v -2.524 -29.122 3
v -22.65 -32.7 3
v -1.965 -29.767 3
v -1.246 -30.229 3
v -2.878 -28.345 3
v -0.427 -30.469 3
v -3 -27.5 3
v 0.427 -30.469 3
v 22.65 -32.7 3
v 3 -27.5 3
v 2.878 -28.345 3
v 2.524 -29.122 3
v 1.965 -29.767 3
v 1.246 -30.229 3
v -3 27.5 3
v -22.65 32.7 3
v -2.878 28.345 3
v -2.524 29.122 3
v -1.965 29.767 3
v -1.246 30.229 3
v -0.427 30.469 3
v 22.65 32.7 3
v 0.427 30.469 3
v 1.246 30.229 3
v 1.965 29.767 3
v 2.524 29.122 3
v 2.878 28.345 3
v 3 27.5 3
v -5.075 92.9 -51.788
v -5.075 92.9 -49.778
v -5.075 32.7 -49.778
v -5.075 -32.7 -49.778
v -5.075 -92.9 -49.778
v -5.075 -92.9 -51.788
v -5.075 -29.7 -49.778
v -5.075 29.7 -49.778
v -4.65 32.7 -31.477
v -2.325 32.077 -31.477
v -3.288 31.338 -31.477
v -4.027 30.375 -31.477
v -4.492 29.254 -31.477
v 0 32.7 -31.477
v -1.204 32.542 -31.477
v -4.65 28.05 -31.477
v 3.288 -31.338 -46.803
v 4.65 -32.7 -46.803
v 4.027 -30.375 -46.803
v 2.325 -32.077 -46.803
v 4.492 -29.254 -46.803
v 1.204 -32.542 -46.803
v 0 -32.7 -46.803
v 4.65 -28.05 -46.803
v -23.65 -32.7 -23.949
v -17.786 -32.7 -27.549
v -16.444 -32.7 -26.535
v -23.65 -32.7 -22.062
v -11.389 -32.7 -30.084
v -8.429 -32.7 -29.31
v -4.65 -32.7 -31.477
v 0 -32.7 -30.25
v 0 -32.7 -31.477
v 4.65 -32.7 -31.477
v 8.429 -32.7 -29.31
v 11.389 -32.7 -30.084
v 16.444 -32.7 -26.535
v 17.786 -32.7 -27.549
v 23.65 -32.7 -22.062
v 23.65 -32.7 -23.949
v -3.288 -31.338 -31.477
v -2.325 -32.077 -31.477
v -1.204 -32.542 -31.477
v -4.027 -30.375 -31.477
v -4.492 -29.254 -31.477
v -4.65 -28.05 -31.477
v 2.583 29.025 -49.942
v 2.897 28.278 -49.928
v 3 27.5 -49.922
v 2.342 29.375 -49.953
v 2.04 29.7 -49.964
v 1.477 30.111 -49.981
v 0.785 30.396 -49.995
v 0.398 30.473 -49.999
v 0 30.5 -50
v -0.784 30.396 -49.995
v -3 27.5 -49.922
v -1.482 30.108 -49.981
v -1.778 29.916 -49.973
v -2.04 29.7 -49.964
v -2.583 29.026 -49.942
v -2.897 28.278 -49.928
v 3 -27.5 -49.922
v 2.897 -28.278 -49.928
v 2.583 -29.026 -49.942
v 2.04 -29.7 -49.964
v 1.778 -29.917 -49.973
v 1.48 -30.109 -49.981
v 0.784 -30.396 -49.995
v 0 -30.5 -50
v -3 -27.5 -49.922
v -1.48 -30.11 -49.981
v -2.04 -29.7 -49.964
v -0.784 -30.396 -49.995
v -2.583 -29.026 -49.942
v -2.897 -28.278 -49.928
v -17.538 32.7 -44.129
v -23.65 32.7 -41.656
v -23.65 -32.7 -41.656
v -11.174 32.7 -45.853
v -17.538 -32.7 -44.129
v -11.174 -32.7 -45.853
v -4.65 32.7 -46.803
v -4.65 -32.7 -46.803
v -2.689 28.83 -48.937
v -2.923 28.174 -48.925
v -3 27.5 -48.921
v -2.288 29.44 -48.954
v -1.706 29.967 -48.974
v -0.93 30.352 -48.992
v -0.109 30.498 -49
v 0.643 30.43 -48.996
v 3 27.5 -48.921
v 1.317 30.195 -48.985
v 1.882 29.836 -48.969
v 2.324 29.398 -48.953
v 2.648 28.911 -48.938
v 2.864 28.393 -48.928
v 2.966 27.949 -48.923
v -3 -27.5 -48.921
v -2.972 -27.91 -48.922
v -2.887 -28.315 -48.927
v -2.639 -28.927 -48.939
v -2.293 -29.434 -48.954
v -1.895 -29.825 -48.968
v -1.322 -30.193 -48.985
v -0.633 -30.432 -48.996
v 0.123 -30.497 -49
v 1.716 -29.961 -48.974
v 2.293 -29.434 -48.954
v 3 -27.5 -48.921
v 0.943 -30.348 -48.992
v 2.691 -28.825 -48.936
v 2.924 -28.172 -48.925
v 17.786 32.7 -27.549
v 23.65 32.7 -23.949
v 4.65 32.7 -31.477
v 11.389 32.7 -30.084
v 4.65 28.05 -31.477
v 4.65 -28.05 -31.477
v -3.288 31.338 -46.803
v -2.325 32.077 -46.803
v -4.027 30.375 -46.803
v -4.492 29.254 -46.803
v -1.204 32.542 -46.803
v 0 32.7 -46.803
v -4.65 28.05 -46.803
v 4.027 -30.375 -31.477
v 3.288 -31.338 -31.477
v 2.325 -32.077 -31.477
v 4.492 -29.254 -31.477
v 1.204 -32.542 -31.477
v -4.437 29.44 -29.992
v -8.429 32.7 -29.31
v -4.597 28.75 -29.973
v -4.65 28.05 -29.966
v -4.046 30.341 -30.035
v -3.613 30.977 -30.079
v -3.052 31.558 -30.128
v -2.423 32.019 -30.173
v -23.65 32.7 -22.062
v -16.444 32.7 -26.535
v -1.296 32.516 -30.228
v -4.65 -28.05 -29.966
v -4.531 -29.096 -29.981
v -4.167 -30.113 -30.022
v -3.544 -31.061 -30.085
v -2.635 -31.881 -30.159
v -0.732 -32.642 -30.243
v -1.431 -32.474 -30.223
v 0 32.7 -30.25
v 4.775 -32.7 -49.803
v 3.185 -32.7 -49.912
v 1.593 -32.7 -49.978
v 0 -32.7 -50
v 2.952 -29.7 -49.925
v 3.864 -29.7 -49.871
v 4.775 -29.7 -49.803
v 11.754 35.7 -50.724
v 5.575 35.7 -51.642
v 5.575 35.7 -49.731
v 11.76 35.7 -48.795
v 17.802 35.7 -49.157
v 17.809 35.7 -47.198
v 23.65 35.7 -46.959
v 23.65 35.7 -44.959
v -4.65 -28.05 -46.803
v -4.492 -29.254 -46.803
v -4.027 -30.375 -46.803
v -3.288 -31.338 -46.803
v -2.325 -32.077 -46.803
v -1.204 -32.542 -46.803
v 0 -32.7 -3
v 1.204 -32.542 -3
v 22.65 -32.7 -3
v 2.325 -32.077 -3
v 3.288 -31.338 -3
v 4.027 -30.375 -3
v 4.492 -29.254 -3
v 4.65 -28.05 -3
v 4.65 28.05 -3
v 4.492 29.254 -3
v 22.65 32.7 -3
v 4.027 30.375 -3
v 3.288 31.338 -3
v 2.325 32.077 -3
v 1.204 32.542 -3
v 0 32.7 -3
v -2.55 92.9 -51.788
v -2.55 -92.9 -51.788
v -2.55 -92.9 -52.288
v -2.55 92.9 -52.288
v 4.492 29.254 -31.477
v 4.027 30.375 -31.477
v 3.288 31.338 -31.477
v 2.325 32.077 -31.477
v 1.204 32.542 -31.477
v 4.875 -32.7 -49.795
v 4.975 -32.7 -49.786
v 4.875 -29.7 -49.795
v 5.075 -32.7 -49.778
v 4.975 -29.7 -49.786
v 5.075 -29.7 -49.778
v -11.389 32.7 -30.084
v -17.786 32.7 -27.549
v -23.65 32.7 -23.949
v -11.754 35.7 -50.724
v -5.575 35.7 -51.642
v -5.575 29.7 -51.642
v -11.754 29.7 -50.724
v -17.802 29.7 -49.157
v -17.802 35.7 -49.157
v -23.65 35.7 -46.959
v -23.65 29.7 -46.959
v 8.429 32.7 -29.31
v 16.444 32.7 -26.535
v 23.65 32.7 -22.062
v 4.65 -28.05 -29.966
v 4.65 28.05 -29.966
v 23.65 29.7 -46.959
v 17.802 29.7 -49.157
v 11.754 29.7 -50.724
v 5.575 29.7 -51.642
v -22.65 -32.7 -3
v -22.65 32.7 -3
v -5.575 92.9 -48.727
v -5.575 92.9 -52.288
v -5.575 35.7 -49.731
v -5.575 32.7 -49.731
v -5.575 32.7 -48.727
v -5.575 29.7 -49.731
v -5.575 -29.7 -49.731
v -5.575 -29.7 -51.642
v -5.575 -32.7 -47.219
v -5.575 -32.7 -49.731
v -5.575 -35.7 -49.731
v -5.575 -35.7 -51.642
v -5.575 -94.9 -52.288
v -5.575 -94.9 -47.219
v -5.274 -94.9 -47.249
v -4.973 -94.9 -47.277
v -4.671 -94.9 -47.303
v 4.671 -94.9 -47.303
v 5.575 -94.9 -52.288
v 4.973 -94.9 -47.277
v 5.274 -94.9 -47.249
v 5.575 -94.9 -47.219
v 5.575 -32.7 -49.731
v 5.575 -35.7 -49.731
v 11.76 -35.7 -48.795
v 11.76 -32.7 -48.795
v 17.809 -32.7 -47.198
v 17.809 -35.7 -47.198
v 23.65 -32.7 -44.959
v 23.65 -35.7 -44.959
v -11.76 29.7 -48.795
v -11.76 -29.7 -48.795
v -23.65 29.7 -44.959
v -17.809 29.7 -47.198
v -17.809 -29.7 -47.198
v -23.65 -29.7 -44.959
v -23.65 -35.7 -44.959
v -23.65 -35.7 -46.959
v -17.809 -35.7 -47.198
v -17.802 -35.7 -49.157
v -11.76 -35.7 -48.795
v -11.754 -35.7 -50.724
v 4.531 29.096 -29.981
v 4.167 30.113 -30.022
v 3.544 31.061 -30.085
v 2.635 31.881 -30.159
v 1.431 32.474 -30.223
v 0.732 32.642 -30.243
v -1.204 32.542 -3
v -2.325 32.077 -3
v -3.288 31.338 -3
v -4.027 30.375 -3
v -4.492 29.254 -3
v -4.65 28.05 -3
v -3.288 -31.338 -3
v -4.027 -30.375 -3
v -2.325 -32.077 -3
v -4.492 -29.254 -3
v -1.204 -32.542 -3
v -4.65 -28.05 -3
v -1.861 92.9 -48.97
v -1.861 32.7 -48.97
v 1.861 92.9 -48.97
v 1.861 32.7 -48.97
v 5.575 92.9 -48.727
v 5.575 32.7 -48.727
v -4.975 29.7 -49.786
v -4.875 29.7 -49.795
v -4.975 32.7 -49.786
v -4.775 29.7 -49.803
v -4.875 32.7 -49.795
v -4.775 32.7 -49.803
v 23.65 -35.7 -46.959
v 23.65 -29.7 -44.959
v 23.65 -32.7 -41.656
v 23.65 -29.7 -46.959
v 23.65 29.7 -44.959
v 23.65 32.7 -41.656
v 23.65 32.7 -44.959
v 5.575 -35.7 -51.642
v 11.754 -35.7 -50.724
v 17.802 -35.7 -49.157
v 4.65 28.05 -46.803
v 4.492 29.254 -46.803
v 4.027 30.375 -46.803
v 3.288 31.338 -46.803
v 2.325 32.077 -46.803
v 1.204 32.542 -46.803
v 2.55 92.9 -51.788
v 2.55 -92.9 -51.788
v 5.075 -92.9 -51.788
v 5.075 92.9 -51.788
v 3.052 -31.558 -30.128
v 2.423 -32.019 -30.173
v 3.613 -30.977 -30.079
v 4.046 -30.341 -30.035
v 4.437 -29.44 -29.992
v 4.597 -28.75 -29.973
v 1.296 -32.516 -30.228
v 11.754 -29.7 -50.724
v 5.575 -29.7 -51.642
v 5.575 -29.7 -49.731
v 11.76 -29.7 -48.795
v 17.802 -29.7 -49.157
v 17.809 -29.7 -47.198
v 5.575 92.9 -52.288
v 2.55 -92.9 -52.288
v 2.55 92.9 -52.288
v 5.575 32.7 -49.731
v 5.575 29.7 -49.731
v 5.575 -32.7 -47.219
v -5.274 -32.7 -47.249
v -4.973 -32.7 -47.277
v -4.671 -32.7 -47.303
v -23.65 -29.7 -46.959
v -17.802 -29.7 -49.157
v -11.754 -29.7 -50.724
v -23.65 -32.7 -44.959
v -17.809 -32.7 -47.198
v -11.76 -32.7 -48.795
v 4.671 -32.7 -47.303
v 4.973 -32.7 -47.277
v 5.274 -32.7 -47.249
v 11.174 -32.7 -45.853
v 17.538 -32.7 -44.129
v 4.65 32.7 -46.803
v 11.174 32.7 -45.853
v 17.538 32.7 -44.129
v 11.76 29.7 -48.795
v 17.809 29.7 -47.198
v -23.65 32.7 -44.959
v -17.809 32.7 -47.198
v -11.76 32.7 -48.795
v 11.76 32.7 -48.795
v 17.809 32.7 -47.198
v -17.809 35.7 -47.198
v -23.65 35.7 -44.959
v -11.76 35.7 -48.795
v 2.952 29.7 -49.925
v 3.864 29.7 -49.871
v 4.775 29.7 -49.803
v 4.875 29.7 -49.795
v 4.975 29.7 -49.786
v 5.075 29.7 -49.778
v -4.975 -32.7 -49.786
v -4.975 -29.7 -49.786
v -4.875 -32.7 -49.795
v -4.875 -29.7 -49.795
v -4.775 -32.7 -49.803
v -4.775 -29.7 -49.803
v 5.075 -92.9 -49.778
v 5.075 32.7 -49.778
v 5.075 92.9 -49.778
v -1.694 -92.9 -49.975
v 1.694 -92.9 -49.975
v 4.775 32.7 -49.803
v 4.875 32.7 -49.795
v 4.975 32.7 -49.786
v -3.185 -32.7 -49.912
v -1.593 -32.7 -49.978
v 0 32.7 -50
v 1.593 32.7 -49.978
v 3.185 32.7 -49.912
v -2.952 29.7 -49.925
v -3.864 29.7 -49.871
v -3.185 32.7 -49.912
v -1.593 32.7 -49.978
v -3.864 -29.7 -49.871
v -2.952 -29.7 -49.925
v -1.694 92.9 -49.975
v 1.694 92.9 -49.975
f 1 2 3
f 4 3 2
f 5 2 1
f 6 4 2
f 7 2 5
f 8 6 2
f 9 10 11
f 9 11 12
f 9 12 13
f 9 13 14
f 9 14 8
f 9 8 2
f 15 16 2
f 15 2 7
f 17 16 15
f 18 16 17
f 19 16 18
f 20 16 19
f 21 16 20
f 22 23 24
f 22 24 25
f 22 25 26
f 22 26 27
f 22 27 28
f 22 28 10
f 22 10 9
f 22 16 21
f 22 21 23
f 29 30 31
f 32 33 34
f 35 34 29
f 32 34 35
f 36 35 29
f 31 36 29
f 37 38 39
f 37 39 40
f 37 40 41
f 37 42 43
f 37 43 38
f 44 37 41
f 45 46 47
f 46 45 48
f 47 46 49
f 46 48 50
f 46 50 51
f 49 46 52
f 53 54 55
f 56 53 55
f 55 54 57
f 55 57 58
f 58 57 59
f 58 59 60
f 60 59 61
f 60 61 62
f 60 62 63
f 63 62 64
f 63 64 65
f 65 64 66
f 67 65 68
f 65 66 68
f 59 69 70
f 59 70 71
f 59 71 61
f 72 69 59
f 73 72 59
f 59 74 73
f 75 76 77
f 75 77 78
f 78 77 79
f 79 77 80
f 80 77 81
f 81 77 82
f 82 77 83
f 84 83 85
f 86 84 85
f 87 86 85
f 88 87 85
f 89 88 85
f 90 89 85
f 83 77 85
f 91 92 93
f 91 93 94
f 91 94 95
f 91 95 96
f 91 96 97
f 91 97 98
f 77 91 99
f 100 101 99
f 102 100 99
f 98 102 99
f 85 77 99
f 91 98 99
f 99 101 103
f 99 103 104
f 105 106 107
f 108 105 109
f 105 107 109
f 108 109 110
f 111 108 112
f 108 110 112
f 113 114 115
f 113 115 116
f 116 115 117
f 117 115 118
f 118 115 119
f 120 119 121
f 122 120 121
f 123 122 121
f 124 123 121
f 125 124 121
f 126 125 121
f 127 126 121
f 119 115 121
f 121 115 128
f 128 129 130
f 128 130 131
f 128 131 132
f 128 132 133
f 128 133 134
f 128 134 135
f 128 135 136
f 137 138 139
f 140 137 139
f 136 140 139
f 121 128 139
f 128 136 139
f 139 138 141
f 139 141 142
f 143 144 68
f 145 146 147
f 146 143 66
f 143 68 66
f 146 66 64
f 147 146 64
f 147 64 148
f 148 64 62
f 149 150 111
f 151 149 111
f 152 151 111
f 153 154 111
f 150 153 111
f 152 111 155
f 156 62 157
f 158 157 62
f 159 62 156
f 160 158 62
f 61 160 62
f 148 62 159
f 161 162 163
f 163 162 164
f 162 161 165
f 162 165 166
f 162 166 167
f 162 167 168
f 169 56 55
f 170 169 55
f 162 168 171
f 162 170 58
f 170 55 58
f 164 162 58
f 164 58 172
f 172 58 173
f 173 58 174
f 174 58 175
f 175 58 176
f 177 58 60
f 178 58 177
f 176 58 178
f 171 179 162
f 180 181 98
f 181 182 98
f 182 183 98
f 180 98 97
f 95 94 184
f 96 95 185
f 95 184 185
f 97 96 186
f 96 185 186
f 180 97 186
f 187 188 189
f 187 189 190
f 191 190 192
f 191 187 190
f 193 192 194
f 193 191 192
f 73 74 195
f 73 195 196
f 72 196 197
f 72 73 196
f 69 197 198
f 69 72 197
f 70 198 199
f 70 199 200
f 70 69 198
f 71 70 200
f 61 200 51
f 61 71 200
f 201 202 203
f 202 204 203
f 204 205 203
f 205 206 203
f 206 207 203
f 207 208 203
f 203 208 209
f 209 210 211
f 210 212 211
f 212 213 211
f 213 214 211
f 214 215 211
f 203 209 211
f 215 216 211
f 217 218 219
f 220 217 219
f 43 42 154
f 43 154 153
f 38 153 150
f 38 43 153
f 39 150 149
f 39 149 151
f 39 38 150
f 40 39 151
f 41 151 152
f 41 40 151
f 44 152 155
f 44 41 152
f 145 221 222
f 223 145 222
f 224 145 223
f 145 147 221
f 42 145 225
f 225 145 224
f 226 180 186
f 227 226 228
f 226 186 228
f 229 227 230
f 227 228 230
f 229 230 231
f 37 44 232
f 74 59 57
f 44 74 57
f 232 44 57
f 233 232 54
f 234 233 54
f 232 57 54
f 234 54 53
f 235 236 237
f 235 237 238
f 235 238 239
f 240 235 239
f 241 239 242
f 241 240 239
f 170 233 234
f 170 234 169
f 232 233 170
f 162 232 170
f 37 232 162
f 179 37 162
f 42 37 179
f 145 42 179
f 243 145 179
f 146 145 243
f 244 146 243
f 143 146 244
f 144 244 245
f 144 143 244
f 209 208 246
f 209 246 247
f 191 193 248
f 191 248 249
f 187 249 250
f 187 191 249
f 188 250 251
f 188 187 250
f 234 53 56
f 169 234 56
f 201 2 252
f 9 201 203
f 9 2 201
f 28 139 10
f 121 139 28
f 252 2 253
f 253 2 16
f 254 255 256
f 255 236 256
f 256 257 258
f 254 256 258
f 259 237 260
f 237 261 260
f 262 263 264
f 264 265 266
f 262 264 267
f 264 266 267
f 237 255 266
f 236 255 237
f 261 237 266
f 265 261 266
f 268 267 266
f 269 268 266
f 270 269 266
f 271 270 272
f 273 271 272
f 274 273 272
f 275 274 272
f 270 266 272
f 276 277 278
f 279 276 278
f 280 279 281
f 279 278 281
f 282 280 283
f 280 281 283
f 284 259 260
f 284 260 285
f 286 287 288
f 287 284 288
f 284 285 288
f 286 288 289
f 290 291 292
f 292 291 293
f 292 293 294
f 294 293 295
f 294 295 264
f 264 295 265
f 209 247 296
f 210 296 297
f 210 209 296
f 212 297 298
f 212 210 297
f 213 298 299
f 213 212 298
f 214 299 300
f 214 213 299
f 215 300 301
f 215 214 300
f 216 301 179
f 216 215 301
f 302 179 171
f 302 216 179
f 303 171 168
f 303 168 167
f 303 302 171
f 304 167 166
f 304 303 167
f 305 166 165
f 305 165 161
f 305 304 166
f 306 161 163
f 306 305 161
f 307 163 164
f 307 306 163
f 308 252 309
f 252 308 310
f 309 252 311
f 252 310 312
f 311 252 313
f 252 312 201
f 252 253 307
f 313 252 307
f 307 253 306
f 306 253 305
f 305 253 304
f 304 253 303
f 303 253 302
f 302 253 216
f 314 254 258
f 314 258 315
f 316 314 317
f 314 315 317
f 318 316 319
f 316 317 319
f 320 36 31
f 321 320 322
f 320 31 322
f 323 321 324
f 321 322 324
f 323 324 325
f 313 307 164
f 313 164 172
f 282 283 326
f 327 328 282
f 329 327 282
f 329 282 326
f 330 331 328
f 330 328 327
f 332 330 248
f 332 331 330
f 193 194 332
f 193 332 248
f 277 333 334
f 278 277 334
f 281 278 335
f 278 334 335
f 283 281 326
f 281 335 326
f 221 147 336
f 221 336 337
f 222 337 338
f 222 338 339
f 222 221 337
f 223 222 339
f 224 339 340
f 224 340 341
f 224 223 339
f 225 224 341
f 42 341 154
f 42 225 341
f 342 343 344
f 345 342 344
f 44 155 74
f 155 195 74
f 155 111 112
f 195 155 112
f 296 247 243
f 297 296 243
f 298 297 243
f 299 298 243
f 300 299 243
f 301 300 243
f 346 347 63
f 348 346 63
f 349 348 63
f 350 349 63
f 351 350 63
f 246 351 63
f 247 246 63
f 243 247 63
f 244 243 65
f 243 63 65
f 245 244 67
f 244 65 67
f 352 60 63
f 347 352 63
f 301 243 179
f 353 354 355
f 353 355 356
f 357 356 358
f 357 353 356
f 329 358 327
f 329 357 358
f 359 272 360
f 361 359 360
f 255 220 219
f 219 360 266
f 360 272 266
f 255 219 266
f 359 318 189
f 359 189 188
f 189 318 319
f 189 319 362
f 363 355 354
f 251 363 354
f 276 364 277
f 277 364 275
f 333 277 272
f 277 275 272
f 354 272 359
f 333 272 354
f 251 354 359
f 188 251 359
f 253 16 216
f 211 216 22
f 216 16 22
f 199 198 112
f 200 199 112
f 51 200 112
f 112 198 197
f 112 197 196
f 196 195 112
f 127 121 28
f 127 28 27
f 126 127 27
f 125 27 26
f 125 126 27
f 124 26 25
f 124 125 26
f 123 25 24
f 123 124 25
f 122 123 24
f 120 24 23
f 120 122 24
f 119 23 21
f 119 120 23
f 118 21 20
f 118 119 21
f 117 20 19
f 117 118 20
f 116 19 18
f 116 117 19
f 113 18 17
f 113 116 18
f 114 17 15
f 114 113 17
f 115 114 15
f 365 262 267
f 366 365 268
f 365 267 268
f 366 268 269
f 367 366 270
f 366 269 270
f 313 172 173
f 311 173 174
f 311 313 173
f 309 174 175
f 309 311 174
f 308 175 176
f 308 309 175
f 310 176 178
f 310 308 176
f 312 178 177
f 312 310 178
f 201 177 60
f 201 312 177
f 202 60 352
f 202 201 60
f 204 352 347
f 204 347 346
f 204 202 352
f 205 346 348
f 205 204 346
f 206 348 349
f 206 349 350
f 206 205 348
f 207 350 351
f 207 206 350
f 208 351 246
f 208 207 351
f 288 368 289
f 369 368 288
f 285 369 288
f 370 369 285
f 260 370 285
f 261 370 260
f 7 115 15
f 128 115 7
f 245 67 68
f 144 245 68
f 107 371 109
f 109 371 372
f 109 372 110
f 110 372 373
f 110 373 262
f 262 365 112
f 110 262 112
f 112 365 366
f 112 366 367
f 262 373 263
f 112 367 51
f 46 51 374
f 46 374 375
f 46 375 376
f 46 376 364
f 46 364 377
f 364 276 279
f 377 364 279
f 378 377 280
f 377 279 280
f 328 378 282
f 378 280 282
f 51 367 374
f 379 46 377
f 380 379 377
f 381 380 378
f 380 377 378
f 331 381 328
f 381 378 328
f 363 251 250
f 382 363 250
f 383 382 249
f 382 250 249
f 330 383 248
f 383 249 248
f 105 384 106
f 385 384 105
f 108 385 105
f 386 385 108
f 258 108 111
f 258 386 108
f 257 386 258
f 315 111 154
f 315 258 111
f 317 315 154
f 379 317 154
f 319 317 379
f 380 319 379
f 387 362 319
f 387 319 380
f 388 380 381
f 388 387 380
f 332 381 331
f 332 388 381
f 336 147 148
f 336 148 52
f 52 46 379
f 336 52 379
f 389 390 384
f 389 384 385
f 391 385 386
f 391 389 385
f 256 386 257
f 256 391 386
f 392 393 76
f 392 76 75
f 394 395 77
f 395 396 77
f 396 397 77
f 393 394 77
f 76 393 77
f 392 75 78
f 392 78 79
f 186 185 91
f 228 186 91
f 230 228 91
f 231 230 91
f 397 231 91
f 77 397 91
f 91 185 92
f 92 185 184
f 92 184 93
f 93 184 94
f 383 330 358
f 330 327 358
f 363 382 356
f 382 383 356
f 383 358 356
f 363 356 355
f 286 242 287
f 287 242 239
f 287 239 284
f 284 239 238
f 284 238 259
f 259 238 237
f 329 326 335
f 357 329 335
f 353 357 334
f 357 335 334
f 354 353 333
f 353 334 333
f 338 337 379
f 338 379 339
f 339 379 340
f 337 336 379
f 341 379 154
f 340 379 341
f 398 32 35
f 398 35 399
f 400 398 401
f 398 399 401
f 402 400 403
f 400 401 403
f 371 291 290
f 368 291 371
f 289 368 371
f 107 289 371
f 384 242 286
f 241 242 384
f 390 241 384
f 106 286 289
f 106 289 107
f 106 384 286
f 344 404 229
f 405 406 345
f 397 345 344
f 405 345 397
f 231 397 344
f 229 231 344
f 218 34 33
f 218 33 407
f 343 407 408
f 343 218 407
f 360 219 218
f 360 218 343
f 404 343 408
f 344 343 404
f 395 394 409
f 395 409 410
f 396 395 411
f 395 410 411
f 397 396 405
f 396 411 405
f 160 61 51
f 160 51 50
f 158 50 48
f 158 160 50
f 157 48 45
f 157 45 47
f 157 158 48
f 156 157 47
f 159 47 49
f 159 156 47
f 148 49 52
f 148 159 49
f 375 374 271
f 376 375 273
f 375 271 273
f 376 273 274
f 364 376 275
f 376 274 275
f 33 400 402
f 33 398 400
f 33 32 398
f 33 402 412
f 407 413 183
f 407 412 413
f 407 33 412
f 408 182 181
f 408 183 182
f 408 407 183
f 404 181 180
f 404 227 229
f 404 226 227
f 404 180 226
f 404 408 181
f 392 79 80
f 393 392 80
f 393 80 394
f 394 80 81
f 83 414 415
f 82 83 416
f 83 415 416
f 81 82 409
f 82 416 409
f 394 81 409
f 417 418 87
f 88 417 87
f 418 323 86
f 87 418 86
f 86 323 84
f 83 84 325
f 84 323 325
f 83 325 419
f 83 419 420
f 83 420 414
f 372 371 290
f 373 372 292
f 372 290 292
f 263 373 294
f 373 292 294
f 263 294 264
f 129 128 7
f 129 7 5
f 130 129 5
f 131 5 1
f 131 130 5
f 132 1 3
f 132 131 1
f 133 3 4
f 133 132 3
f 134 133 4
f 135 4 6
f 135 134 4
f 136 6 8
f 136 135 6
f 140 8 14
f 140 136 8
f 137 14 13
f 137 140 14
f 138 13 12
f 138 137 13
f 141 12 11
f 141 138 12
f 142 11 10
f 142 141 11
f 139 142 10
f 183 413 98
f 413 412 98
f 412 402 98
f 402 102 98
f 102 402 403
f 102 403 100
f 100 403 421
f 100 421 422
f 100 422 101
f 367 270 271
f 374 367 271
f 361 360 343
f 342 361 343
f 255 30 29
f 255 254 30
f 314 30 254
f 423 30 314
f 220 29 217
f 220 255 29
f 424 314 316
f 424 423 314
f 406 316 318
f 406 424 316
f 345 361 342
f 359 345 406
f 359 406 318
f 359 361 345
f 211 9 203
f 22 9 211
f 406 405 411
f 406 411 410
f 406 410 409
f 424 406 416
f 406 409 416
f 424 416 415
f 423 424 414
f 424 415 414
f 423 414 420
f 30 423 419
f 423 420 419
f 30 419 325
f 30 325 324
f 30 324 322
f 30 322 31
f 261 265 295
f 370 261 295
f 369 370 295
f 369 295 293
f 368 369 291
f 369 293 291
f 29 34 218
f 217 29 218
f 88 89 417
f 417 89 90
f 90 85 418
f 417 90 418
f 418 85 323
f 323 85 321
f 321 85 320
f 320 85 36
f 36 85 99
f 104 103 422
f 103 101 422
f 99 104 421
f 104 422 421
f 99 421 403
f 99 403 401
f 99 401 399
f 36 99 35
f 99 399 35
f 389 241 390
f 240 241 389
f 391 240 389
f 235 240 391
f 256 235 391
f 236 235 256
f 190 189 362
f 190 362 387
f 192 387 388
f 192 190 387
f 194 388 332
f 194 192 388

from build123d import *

# Parameters (mm, degrees)
SKETCH1_W                = 45.3
SKETCH1_H                = 65.4
BOSS_EXTRUDE1_DEPTH      = 3
BOSS_EXTRUDE2_DEPTH      = 27.25
BOSS_EXTRUDE3_START      = -32.7
BOSS_EXTRUDE3_DEPTH      = 65.4
CUT_EXTRUDE1_DEPTH       = 65.254280101
CUT_EXTRUDE1_DEPTH_BACK  = 65.254280101
CUT_EXTRUDE3_DEPTH       = 15.325997
BOSS_EXTRUDE4_START      = 6
BOSS_EXTRUDE4_DEPTH      = 6
CUT_EXTRUDE4_DEPTH       = 92.386822264
BOSS_EXTRUDE5_DEPTH      = 92.9
BOSS_EXTRUDE5_DEPTH_BACK = 92.9
BOSS_EXTRUDE6_DEPTH      = 60.2
BOSS_EXTRUDE7_START      = 2
BOSS_EXTRUDE7_DEPTH      = 2
BOSS_EXTRUDE8_START      = -63.2
BOSS_EXTRUDE8_DEPTH      = 123.4


# Read off the part's stored shape, not the designer's step: Boss-Extrude3
with BuildPart() as part:
    # Sketch1 → Boss-Extrude1 (new, symmetric)
    with BuildSketch(Plane.XY):
        Rectangle(SKETCH1_W, SKETCH1_H)
        with BuildLine():
            Line((3, 27.5), (3, -27.5))
            ThreePointArc((3, -27.5), (0, -30.5), (-3, -27.5))
            Line((-3, -27.5), (-3, 27.5))
            ThreePointArc((-3, 27.5), (0, 30.5), (3, 27.5))
        make_face(mode=Mode.SUBTRACT)
    extrude(amount=BOSS_EXTRUDE1_DEPTH, both=True)

    # Sketch3 → Boss-Extrude2 (add)
    with BuildSketch(Plane(origin=(0, 0, -3), x_dir=(-1, 0, 0), z_dir=(0, 0, -1))):
        with BuildLine():
            Line((4.65, 28.050000345), (4.65, -28.050000676))
            ThreePointArc((4.65, -28.050000676), (0, -32.7), (-4.65, -28.050000677))
            Line((-4.65, -28.050000677), (-4.65, 28.050000345))
            ThreePointArc((-4.65, 28.050000345), (0, 32.7), (4.65, 28.050000345))
        make_face()
    extrude(amount=BOSS_EXTRUDE2_DEPTH)

    # Boss-Extrude3 outline → Boss-Extrude3 (add)
    with BuildSketch(Plane(origin=(0, 0, 0), x_dir=(1, 0, 0), z_dir=(0, 1, 0)).offset(BOSS_EXTRUDE3_START)):
        with BuildLine():
            Line((4.65, 31.477081959), (4.65, 46.803079293))
            ThreePointArc((4.65, 46.803079293), (14.382164808, 45.086281989), (23.65, 41.655588809))
            Line((23.65, 41.655588809), (23.65, 44.959205999))
            ThreePointArc((23.65, 44.959205999), (0, 50), (-23.65, 44.959205999))
            Line((-23.65, 44.959205999), (-23.65, 41.655588809))
            ThreePointArc((-23.65, 41.655588809), (-14.382164808, 45.086281989), (-4.65, 46.803079293))
            Line((-4.65, 46.803079293), (-4.65, 31.477081959))
            ThreePointArc((-4.65, 31.477081959), (-14.64207711, 28.955000716), (-23.65, 23.949021894))
            Line((-23.65, 23.949021894), (-23.65, 22.06226871))
            ThreePointArc((-23.65, 22.06226871), (-12.513607029, 28.145153743), (3e-09, 30.25))
            ThreePointArc((3e-09, 30.25), (12.513607029, 28.145153743), (23.65, 22.06226871))
            Line((23.65, 22.06226871), (23.65, 23.949021894))
            ThreePointArc((23.65, 23.949021894), (14.64207711, 28.955000716), (4.65, 31.477081959))
        make_face()
    extrude(amount=BOSS_EXTRUDE3_DEPTH)

    # Sketch5 → Cut-Extrude1 (cut, two sides: drawn at the far end of the back side and taken through both)
    with BuildSketch(Plane.XY.offset(-CUT_EXTRUDE1_DEPTH_BACK)):
        with BuildLine():
            Line((3, -27.5), (3, 27.5))
            ThreePointArc((3, 27.5), (0, 30.5), (-3, 27.5))
            Line((-3, 27.5), (-3, -27.5))
            ThreePointArc((-3, -27.5), (0, -30.5), (3, -27.5))
        make_face()
    extrude(amount=CUT_EXTRUDE1_DEPTH + CUT_EXTRUDE1_DEPTH_BACK, mode=Mode.SUBTRACT)

    # Sketch6 → Cut-Extrude3 (cut)
    with BuildSketch(Plane(origin=(0, 0, -31.477081959), x_dir=(-1, 0, 0), z_dir=(0, 0, -1))):
        with BuildLine():
            ThreePointArc((0, -32.7), (-3.288046293, -31.338046772), (-4.65, -28.050000677))
            Line((-4.65, -28.050000677), (-4.65, -32.7))
            Line((-4.65, -32.7), (0, -32.7))
        make_face()
        with BuildLine():
            ThreePointArc((4.65, -28.050000676), (3.288046294, -31.338046771), (0, -32.7))
            Line((0, -32.7), (4.65, -32.7))
            Line((4.65, -32.7), (4.65, -28.050000676))
        make_face()
        with BuildLine():
            Line((-4.65, 32.7), (-4.65, 28.050000345))
            ThreePointArc((-4.65, 28.050000345), (-3.288046411, 31.338046654), (0, 32.7))
            Line((0, 32.7), (-4.65, 32.7))
        make_face()
        with BuildLine():
            Line((4.65, 32.7), (0, 32.7))
            ThreePointArc((0, 32.7), (3.28804641, 31.338046655), (4.65, 28.050000345))
            Line((4.65, 28.050000345), (4.65, 32.7))
        make_face()
    extrude(amount=CUT_EXTRUDE3_DEPTH, mode=Mode.SUBTRACT)

    # Sketch8 → Boss-Extrude4 (add)
    with BuildSketch(Plane(origin=(0, -29.7, 0), x_dir=(-1, 0, 0), z_dir=(0, -1, 0)).offset(BOSS_EXTRUDE4_START)):
        with BuildLine():
            ThreePointArc((23.65, 44.959205999), (0, 50), (-23.65, 44.959205999))
            Line((-23.65, 44.959205999), (-23.65, 46.959205999))
            ThreePointArc((-23.65, 46.959205999), (0, 51.906346228), (23.65, 46.959205999))
            Line((23.65, 46.959205999), (23.65, 44.959205999))
        make_face()
    boss_extrude4 = extrude(amount=-BOSS_EXTRUDE4_DEPTH)

    # Mirror1: Boss-Extrude4 across plane
    add(boss_extrude4.mirror(Plane.ZX))

    # Sketch10 → Cut-Extrude4 (cut, through all)
    with BuildSketch(Plane(origin=(0, 35.7, 0), x_dir=(1, 0, 0), z_dir=(0, 1, 0))):
        with BuildLine():
            ThreePointArc((0, 51.906346228), (-2.389460165, 51.857943444), (-4.775, 51.712814503))
            Line((-4.775, 51.712814503), (-4.775, 49.803108697))
            ThreePointArc((-4.775, 49.803108697), (-2.389528781, 49.950756269), (0, 50))
            Line((0, 50), (0, 51.906346228))
        make_face()
        with BuildLine():
            ThreePointArc((4.775, 51.712814503), (2.389460165, 51.857943444), (0, 51.906346228))
            Line((0, 51.906346228), (0, 50))
            ThreePointArc((0, 50), (2.389528781, 49.950756269), (4.775, 49.803108697))
            Line((4.775, 49.803108697), (4.775, 51.712814503))
        make_face()
        with BuildLine():
            ThreePointArc((-4.775, 51.712814503), (-4.925016027, 51.700441497), (-5.075, 51.687685822))
            Line((-5.075, 51.687685822), (-5.075, 49.777542134))
            ThreePointArc((-5.075, 49.777542134), (-4.92501659, 49.790520084), (-4.775, 49.803108697))
            Line((-4.775, 49.803108697), (-4.775, 51.712814503))
        make_face()
        with BuildLine():
            ThreePointArc((5.075, 51.687685822), (4.925016027, 51.700441497), (4.775, 51.712814503))
            Line((4.775, 51.712814503), (4.775, 49.803108697))
            ThreePointArc((4.775, 49.803108697), (4.92501659, 49.790520084), (5.075, 49.777542134))
            Line((5.075, 49.777542134), (5.075, 51.687685822))
        make_face()
    extrude(amount=-CUT_EXTRUDE4_DEPTH, mode=Mode.SUBTRACT)

    # Sketch11 → Boss-Extrude5 (add, two sides: drawn at the far end of the back side and taken through both)
    with BuildSketch(Plane(origin=(0, 0, 0), x_dir=(1, 0, 0), z_dir=(0, 1, 0)).offset(-BOSS_EXTRUDE5_DEPTH_BACK)):
        with BuildLine():
            ThreePointArc((-5.575, 49.731441823), (-5.325049888, 49.755033059), (-5.075, 49.777542134))
            Line((-5.075, 49.777542134), (-5.075, 51.787685822))
            Line((-5.075, 51.787685822), (-2.55, 51.787685822))
            Line((-2.55, 51.787685822), (-2.55, 52.287685822))
            Line((-2.55, 52.287685822), (-5.575, 52.287685822))
            Line((-5.575, 52.287685822), (-5.575, 49.731441823))
        make_face()
        with BuildLine():
            ThreePointArc((5.075, 49.777542134), (5.325049888, 49.755033059), (5.575, 49.731441823))
            Line((5.575, 49.731441823), (5.575, 52.287685822))
            Line((5.575, 52.287685822), (2.55, 52.287685822))
            Line((2.55, 52.287685822), (2.55, 51.787685822))
            Line((2.55, 51.787685822), (5.075, 51.787685822))
            Line((5.075, 51.787685822), (5.075, 49.777542134))
        make_face()
    extrude(amount=BOSS_EXTRUDE5_DEPTH + BOSS_EXTRUDE5_DEPTH_BACK)

    # Sketch13 → Boss-Extrude6 (add)
    with BuildSketch(Plane(origin=(0, -92.9, 0), x_dir=(-1, 0, 0), z_dir=(0, -1, 0))):
        with BuildLine():
            ThreePointArc((-5.075, 49.777542134), (-5.325049888, 49.755033059), (-5.575, 49.731441823))
            Line((-5.575, 49.731441823), (-5.575, 47.219284448))
            ThreePointArc((-5.575, 47.219284448), (-5.123234459, 47.263029854), (-4.671126278, 47.303079293))
            Line((-4.671126278, 47.303079293), (0, 47.303079293))
            Line((0, 47.303079293), (4.671126278, 47.303079293))
            ThreePointArc((4.671126278, 47.303079293), (5.123234459, 47.263029854), (5.575, 47.219284448))
            Line((5.575, 47.219284448), (5.575, 49.731441823))
            ThreePointArc((5.575, 49.731441823), (5.325049888, 49.755033059), (5.075, 49.777542134))
            ThreePointArc((5.075, 49.777542134), (0, 50), (-5.075, 49.777542134))
        make_face()
    extrude(amount=-BOSS_EXTRUDE6_DEPTH)

    # Sketch14 → Boss-Extrude7 (add)
    with BuildSketch(Plane(origin=(0, -92.9, 0), x_dir=(-1, 0, 0), z_dir=(0, -1, 0)).offset(BOSS_EXTRUDE7_START)):
        with BuildLine():
            Line((-2.55, 52.287685822), (2.55, 52.287685822))
            Line((2.55, 52.287685822), (5.575, 52.287685822))
            Line((5.575, 52.287685822), (5.575, 47.219284448))
            ThreePointArc((5.575, 47.219284448), (5.123234459, 47.263029854), (4.671126278, 47.303079293))
            Line((4.671126278, 47.303079293), (-4.671126278, 47.303079293))
            ThreePointArc((-4.671126278, 47.303079293), (-5.123234459, 47.263029854), (-5.575, 47.219284448))
            Line((-5.575, 47.219284448), (-5.575, 52.287685822))
            Line((-5.575, 52.287685822), (-2.55, 52.287685822))
        make_face()
    extrude(amount=-BOSS_EXTRUDE7_DEPTH)

    # Sketch15 → Boss-Extrude8 (add)
    with BuildSketch(Plane(origin=(0, 32.7, 0), x_dir=(1, 0, 0), z_dir=(0, 1, 0)).offset(BOSS_EXTRUDE8_START)):
        with BuildLine():
            ThreePointArc((-5.075, 49.777542134), (-5.325049888, 49.755033059), (-5.575, 49.731441823))
            Line((-5.575, 49.731441823), (-5.575, 48.726707775))
            ThreePointArc((-5.575, 48.726707775), (0, 49), (5.575, 48.726707775))
            Line((5.575, 48.726707775), (5.575, 49.731441823))
            ThreePointArc((5.575, 49.731441823), (5.325049888, 49.755033059), (5.075, 49.777542134))
            ThreePointArc((5.075, 49.777542134), (0, 50), (-5.075, 49.777542134))
        make_face()
    boss_extrude8 = extrude(amount=BOSS_EXTRUDE8_DEPTH)

    # Mirror2: Boss-Extrude8 across plane
    add(boss_extrude8.mirror(Plane.ZX))


solid = part.part
